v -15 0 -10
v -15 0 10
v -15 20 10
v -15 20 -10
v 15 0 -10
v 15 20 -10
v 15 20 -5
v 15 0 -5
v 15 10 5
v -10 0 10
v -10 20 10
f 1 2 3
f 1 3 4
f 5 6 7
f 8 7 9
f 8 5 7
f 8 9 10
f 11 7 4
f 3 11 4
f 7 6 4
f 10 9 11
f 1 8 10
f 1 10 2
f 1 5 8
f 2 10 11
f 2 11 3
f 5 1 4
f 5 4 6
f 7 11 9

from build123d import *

# Parameters (mm, degrees)
EXTRUDE_1_DEPTH     = 20
SKETCH_4_W          = 39.68109217
SKETCH_4_H          = 19.592945183
CUT_EXTRUDE_1_DEPTH = 20
SKETCH_7_W          = 132.193091595
SKETCH_7_H          = 30.201739996
CUT_EXTRUDE_2_DEPTH = 20


with BuildPart() as part:
    # 草圖1 → 填料-伸長1 (new body)
    with BuildSketch(Plane(origin=(0, 0, 0), x_dir=(1, 0, 0), z_dir=(0, 1, 0))):
        Polygon((15, -5), (-10, -10), (-15, -10), (-15, 10), (15, 10), align=None)
    extrude(amount=EXTRUDE_1_DEPTH)

    # 草圖4 → 除料-伸長1 (cut)
    with BuildSketch(Plane(origin=(6.101694915, 10.169491525, 10.169491525), x_dir=(0.920574618, -0.276172385, -0.276172385), z_dir=(0.390566733, 0.650944555, 0.650944555))):
        with Locations((1.579314275, 10.72678571)):
            Rectangle(SKETCH_4_W, SKETCH_4_H)
    extrude(amount=CUT_EXTRUDE_1_DEPTH, mode=Mode.SUBTRACT)

    # 草圖7 → 除料-伸長2 (cut)
    with BuildSketch(Plane(origin=(1.016949153, -1.694915254, 1.694915254), x_dir=(-0.920574618, -0.276172385, 0.276172385), z_dir=(-0.390566733, 0.650944555, -0.650944555))):
        with Locations((9.754035329, 10.9182289)):
            Rectangle(SKETCH_7_W, SKETCH_7_H)
    extrude(amount=-CUT_EXTRUDE_2_DEPTH, mode=Mode.SUBTRACT)


solid = part.part
